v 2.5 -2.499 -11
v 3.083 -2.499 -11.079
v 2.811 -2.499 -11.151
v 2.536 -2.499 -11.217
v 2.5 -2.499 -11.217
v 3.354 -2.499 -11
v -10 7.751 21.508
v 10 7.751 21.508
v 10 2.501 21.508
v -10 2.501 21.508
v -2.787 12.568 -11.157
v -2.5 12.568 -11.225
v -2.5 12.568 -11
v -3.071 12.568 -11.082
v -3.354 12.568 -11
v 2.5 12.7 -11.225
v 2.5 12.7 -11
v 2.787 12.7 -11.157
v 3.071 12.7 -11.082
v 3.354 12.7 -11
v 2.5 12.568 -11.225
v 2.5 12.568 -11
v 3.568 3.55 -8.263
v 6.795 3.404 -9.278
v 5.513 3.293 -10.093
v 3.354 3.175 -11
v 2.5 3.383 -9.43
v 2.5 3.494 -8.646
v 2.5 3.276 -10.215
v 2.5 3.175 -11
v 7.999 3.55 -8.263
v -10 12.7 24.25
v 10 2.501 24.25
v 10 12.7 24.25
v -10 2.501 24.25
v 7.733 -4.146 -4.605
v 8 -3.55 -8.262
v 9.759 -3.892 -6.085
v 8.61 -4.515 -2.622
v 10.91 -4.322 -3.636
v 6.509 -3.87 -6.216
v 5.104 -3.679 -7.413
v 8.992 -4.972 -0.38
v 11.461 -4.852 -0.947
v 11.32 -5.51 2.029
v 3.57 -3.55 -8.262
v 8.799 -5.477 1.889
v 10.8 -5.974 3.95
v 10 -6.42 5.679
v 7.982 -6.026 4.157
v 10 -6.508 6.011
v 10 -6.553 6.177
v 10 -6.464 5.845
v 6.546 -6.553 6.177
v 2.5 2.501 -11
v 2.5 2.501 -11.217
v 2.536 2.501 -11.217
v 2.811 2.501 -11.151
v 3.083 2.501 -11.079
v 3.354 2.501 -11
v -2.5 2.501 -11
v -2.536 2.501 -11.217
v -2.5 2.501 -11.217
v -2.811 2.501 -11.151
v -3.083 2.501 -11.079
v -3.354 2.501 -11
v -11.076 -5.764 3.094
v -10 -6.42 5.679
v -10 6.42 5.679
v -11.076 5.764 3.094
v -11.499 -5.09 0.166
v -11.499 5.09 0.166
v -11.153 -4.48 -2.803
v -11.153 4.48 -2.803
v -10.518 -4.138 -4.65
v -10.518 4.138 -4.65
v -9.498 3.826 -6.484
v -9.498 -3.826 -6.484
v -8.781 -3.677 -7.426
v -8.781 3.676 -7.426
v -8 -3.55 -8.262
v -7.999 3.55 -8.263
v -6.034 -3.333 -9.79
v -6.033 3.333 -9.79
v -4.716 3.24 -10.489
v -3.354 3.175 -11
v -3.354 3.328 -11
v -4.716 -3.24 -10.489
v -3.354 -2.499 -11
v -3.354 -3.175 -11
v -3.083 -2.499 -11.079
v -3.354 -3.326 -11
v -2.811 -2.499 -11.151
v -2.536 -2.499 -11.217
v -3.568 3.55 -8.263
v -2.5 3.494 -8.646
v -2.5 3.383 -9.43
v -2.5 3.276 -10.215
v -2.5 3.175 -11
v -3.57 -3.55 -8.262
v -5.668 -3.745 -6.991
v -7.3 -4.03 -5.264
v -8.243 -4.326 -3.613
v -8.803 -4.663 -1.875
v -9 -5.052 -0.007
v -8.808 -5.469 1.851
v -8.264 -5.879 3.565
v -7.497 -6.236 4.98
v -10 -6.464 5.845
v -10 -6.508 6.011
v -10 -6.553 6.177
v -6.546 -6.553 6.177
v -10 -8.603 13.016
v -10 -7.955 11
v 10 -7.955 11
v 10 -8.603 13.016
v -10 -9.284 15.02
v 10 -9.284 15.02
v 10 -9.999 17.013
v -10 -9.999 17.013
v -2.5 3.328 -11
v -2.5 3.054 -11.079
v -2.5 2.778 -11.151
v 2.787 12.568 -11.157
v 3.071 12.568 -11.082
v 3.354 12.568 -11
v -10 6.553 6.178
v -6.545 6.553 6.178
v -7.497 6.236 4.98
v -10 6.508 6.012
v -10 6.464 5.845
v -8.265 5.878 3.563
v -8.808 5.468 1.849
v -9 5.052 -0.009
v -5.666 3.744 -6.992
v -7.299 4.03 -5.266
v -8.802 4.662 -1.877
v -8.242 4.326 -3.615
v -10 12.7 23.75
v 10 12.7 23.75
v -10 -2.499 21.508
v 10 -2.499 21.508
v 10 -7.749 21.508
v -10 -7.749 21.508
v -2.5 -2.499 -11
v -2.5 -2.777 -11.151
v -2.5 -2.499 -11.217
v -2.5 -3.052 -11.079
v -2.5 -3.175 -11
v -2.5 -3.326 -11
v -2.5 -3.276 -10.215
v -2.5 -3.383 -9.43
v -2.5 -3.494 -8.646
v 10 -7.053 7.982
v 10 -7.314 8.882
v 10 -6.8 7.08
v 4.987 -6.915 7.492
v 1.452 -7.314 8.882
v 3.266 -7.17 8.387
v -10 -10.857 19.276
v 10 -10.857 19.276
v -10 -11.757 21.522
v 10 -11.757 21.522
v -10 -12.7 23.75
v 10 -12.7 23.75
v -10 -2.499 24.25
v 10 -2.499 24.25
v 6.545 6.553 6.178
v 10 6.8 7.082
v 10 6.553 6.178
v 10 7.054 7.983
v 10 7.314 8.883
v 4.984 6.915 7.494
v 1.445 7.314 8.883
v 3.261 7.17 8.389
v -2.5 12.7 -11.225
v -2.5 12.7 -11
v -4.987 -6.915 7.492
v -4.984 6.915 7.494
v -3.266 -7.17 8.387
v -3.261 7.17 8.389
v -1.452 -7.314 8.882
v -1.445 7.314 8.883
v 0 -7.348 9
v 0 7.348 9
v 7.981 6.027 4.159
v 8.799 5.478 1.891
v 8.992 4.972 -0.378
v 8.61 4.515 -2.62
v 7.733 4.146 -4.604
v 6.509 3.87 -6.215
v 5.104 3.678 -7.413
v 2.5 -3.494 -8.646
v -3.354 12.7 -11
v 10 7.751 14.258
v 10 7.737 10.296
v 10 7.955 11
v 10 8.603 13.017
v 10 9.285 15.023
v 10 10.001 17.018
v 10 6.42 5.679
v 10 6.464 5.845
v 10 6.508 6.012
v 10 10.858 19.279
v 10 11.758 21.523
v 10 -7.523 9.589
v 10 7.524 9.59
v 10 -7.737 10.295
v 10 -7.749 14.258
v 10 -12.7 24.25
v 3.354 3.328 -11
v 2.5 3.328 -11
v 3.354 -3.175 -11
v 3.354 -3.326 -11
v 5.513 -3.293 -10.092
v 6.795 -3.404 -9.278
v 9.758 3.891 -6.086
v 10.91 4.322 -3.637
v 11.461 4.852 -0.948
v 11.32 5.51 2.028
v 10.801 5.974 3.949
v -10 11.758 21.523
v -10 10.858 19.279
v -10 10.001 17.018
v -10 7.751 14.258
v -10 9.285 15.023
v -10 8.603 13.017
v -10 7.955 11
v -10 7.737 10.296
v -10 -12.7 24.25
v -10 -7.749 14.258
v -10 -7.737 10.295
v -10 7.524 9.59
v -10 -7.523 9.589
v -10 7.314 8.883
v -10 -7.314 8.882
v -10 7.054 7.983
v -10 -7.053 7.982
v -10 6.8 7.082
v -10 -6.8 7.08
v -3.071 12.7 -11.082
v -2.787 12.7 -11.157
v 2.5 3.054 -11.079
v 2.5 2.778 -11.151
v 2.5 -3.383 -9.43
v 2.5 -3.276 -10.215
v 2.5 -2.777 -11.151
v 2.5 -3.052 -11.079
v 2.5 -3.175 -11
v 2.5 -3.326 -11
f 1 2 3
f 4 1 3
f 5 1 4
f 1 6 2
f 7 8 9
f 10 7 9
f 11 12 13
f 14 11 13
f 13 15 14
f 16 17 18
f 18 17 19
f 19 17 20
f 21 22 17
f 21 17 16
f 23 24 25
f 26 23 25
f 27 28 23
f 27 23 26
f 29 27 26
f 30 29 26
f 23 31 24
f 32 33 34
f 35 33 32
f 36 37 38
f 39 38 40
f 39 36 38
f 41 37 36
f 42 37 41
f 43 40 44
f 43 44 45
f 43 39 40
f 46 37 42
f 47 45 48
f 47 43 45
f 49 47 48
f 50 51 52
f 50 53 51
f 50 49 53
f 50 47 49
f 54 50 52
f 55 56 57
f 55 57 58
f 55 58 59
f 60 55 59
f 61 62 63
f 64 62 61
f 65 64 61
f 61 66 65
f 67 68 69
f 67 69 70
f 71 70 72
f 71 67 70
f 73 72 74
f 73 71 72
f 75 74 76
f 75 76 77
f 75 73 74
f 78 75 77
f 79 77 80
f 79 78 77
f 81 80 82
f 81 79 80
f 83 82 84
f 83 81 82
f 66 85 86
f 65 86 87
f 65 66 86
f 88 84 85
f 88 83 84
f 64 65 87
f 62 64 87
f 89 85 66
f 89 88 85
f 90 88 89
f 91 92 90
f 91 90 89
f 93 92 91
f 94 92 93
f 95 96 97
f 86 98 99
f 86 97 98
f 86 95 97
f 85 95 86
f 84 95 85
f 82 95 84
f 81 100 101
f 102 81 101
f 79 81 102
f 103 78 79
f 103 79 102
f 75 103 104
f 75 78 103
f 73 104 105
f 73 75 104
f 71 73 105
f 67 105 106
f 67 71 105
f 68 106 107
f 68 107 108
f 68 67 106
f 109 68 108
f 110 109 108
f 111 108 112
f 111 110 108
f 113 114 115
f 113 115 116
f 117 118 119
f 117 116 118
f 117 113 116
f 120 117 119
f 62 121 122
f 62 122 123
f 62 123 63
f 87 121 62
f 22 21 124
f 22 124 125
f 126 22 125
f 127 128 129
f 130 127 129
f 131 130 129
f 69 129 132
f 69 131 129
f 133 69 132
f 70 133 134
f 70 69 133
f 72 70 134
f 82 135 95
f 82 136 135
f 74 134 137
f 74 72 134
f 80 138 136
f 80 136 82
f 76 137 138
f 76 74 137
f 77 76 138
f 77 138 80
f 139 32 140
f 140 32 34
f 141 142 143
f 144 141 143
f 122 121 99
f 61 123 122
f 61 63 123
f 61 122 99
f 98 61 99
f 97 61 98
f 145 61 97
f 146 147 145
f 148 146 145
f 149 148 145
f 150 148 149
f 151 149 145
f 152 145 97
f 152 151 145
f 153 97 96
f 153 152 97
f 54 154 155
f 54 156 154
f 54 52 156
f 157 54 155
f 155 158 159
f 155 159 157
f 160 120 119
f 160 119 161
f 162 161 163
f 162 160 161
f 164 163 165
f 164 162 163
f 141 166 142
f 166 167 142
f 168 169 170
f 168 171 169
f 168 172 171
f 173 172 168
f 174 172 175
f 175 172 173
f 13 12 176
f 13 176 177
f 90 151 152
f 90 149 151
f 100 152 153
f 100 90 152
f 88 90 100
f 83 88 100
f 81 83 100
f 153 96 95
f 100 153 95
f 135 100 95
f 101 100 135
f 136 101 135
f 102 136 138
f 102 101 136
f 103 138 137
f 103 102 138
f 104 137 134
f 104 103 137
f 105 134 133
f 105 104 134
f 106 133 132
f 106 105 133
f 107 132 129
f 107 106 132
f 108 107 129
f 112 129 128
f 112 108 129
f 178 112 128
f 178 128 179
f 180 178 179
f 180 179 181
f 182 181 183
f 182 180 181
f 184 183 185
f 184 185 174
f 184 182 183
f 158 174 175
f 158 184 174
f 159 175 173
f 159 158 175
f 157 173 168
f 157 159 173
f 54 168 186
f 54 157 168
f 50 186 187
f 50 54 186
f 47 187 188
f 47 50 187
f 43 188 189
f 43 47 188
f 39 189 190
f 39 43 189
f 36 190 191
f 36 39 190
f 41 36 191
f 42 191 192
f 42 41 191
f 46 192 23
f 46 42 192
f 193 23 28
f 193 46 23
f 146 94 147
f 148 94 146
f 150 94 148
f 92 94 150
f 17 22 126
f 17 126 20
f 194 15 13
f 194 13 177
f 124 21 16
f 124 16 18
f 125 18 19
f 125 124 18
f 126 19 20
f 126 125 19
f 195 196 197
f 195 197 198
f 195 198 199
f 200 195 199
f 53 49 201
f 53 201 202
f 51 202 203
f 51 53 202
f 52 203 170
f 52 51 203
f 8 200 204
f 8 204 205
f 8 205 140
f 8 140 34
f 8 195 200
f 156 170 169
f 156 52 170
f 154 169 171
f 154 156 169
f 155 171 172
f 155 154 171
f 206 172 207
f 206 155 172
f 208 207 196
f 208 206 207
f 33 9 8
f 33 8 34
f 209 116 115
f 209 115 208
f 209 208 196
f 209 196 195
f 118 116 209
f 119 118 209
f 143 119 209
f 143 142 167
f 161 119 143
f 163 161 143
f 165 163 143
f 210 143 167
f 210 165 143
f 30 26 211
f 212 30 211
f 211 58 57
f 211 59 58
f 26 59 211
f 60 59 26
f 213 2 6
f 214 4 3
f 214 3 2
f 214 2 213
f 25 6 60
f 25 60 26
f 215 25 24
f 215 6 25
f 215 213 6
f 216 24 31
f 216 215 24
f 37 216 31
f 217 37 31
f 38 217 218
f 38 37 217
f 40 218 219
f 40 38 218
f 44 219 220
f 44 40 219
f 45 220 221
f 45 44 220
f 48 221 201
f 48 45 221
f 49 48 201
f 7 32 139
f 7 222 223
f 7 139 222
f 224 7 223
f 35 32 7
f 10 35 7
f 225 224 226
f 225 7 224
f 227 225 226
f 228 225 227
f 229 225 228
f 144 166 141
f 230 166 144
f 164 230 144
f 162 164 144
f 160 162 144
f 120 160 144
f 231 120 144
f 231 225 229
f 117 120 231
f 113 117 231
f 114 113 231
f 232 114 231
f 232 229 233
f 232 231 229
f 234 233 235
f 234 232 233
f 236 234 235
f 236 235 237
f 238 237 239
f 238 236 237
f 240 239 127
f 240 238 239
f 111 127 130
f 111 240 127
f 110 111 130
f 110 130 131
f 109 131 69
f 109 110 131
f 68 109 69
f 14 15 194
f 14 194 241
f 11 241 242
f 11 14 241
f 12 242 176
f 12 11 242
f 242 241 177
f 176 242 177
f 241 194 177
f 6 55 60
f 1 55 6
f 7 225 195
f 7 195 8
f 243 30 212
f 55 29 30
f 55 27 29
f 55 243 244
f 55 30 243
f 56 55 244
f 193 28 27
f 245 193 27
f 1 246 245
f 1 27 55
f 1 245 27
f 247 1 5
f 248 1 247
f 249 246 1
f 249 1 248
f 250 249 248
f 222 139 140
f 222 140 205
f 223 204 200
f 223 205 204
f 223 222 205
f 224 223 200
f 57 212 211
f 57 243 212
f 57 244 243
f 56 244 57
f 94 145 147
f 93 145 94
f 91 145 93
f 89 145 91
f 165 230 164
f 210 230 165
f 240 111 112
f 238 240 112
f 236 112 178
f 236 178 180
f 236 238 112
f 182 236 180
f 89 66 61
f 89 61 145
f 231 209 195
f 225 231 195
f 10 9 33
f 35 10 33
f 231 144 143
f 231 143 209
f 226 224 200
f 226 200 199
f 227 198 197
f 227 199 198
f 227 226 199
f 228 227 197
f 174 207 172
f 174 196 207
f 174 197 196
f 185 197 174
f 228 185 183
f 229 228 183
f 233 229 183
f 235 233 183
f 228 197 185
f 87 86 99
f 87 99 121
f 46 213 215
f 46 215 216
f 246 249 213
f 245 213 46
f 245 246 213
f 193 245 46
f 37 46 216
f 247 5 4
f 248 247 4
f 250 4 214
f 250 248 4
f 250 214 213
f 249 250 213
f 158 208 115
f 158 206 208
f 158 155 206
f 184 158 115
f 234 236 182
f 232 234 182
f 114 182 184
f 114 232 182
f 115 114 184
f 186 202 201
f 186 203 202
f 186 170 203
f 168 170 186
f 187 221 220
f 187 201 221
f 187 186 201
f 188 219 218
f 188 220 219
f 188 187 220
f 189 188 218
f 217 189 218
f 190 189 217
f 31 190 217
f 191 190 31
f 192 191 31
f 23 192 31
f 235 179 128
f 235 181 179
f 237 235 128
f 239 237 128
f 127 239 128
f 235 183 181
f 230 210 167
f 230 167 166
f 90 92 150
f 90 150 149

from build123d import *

# Parameters (mm, degrees)
F1_DEPTH = 12.7
F2_W     = 5
F2_H     = 0.5081468204
F3_DEPTH = 12.7


with BuildPart() as f1:
    # F0 (on Front) → F1 (new body, symmetric)
    with BuildSketch(Plane.XZ):
        with BuildLine():
            ThreePointArc((-2.5, -8.6458082329), (0, 9), (2.5, -8.6458082329))
            Line((2.5, -8.6458082329), (2.5, -11.2249721603))
            ThreePointArc((2.5, -11.2249721603), (10.5117930935, -4.6639260241), (10, 5.6789083458))
            ThreePointArc((10, 5.6789083458), (0, 11.5), (-10, 5.6789083458))
            ThreePointArc((-10, 5.6789083458), (-10.5117930935, -4.6639260241), (-2.5, -11.2249721603))
            Line((-2.5, -11.2249721603), (-2.5, -8.6458082329))
        make_face()
        with BuildLine():
            ThreePointArc((-10, 5.6789083458), (0, 11.5), (10, 5.6789083458))
            Line((10, 5.6789083458), (10, 11.5))
            Line((10, 11.5), (10, 24.25))
            Line((10, 24.25), (2.5, 24.25))
            Line((2.5, 24.25), (-2.5, 24.25))
            Line((-2.5, 24.25), (-10, 24.25))
            Line((-10, 24.25), (-10, 11.5))
            Line((-10, 11.5), (-10, 5.6789083458))
        make_face()
    extrude(amount=F1_DEPTH, both=True)

    # F2 (on Right) → F3 (cut, symmetric)
    with BuildSketch(Plane.YZ):
        with BuildLine():
            Line((-12.7, 11), (-9.999146387, 11))
            Line((-9.999146387, 11), (-9.999146387, 11.5081468204))
            Line((-9.999146387, 11.5081468204), (-9.999146387, 17.0131495997))
            ThreePointArc((-9.999146387, 17.0131495997), (-11.3014367737, 20.4008730498), (-12.7, 23.75))
            Line((-12.7, 23.75), (-12.7, 11))
        make_face()
        with Locations((0.000853613, 24.0040734102)):
            Rectangle(F2_W, F2_H)
        with BuildLine():
            Line((10.000853613, 11), (12.7, 11))
            Line((12.7, 11), (12.7, 23.75))
            ThreePointArc((12.7, 23.75), (11.3023562764, 20.4031665386), (10.000853613, 17.0177872374))
            Line((10.000853613, 17.0177872374), (10.000853613, 11.5081468204))
            Line((10.000853613, 11.5081468204), (10.000853613, 11))
        make_face()
        with BuildLine():
            Line((7.9549180029, 11), (10.000853613, 11))
            Line((10.000853613, 11), (10.000853613, 11.5081468204))
            Line((10.000853613, 11.5081468204), (10.000853613, 17.0177872374))
            ThreePointArc((10.000853613, 17.0177872374), (8.9402327942, 14.0216949423), (7.9549180029, 11))
        make_face()
        with BuildLine():
            Line((-9.999146387, 11), (-7.9549180029, 11))
            ThreePointArc((-7.9549180029, 11), (-8.9394374516, 14.0193554966), (-9.999146387, 17.0131495997))
            Line((-9.999146387, 17.0131495997), (-9.999146387, 11.5081468204))
            Line((-9.999146387, 11.5081468204), (-9.999146387, 11))
        make_face()
        with BuildLine():
            ThreePointArc((-7.3137125104, 8.8821043606), (-7.6297024253, 9.9424487424), (-7.9549180029, 11))
            Line((-7.9549180029, 11), (-9.999146387, 11))
            Line((-9.999146387, 11), (-9.999146387, 5.6870551662))
            ThreePointArc((-9.999146387, 5.6870551662), (-8.8025908747, 7.4074282146), (-7.3137125104, 8.8821043606))
        make_face()
        with BuildLine():
            Line((-12.7, 11), (-12.7, -11))
            Line((-12.7, -11), (-3.3264130702, -11))
            ThreePointArc((-3.3264130702, -11), (-10.6770891589, -4.2616937105), (-9.999146387, 5.6870551662))
            Line((-9.999146387, 5.6870551662), (-9.999146387, 11))
            Line((-9.999146387, 11), (-12.7, 11))
        make_face()
        with BuildLine():
            Line((10.000853613, 5.6870551662), (10.000853613, 11))
            Line((10.000853613, 11), (7.9549180029, 11))
            ThreePointArc((7.9549180029, 11), (7.6298735118, 9.9430138349), (7.314044827, 8.8832374829))
            ThreePointArc((7.314044827, 8.8832374829), (8.8037248976, 7.408110141), (10.000853613, 5.6870551662))
        make_face()
        with BuildLine():
            Line((12.7, -11), (12.7, 11))
            Line((12.7, 11), (10.000853613, 11))
            Line((10.000853613, 11), (10.000853613, 5.6870551662))
            ThreePointArc((10.000853613, 5.6870551662), (10.678796385, -4.2616937105), (3.3281202962, -11))
            Line((3.3281202962, -11), (12.5679420307, -11))
            Line((12.5679420307, -11), (12.7, -11))
        make_face()
        with BuildLine():
            ThreePointArc((3.3281202962, -11), (10.678796385, -4.2616937105), (10.000853613, 5.6870551662))
            ThreePointArc((10.000853613, 5.6870551662), (8.8037248976, 7.408110141), (7.314044827, 8.8832374829))
            ThreePointArc((7.314044827, 8.8832374829), (6.9260805224, 7.5327733856), (6.5530808328, 6.1780996938))
            ThreePointArc((6.5530808328, 6.1780996938), (8.8123094834, -1.8244048007), (3.5497974059, -8.2625845835))
            ThreePointArc((3.5497974059, -8.2625845835), (3.3549542371, -9.6302730213), (3.175, -11))
            Line((3.175, -11), (3.3281202962, -11))
        make_face()
        with BuildLine():
            ThreePointArc((3.5497974059, -8.2625845835), (8.8123094834, -1.8244048007), (6.5530808328, 6.1780996938))
            ThreePointArc((6.5530808328, 6.1780996938), (4.8416208698, -0.9986057543), (3.5497974059, -8.2625845835))
        make_face()
        with BuildLine():
            ThreePointArc((-3.5499132309, -8.2618020803), (-4.8415527422, -0.9989333343), (-6.5527010025, 6.1766897522))
            ThreePointArc((-6.5527010025, 6.1766897522), (-8.8106070853, -1.8243815864), (-3.5499132309, -8.2618020803))
        make_face()
        with BuildLine():
            ThreePointArc((-6.5527010025, 6.1766897522), (-6.9257229394, 7.5315021944), (-7.3137125104, 8.8821043606))
            ThreePointArc((-7.3137125104, 8.8821043606), (-8.8025908747, 7.4074282146), (-9.999146387, 5.6870551662))
            ThreePointArc((-9.999146387, 5.6870551662), (-10.6770891589, -4.2616937105), (-3.3264130702, -11))
            Line((-3.3264130702, -11), (-3.175, -11))
            ThreePointArc((-3.175, -11), (-3.3550078896, -9.6298811629), (-3.5499132309, -8.2618020803))
            ThreePointArc((-3.5499132309, -8.2618020803), (-8.8106070853, -1.8243815864), (-6.5527010025, 6.1766897522))
        make_face()
        with BuildLine():
            Line((12.5679420307, -24.2508184165), (12.5679420307, -11))
            Line((12.5679420307, -11), (3.3281202962, -11))
            ThreePointArc((3.3281202962, -11), (2.9165032072, -11.1161053992), (2.500853613, -11.2168253399))
            Line((2.500853613, -11.2168253399), (2.500853613, -11))
            Line((2.500853613, -11), (0, -11))
            Line((0, -11), (-2.499146387, -11))
            Line((-2.499146387, -11), (-2.499146387, -11.2168253399))
            ThreePointArc((-2.499146387, -11.2168253399), (-2.9147959812, -11.1161053992), (-3.3264130702, -11))
            Line((-3.3264130702, -11), (-12.7, -11))
            Line((-12.7, -11), (-12.7, -24.2508184165))
            Line((-12.7, -24.2508184165), (12.5679420307, -24.2508184165))
        make_face()
        Polygon((2.500853613, 21.5081468204), (2.500853613, 23.75), (-2.499146387, 23.75), (-2.499146387, 21.5081468204), (-7.749146387, 21.5081468204), (-7.749146387, 14.2581468204), (7.750853613, 14.2581468204), (7.750853613, 21.5081468204), align=None)
    extrude(amount=F3_DEPTH, both=True, mode=Mode.SUBTRACT)


solid = f1.part
